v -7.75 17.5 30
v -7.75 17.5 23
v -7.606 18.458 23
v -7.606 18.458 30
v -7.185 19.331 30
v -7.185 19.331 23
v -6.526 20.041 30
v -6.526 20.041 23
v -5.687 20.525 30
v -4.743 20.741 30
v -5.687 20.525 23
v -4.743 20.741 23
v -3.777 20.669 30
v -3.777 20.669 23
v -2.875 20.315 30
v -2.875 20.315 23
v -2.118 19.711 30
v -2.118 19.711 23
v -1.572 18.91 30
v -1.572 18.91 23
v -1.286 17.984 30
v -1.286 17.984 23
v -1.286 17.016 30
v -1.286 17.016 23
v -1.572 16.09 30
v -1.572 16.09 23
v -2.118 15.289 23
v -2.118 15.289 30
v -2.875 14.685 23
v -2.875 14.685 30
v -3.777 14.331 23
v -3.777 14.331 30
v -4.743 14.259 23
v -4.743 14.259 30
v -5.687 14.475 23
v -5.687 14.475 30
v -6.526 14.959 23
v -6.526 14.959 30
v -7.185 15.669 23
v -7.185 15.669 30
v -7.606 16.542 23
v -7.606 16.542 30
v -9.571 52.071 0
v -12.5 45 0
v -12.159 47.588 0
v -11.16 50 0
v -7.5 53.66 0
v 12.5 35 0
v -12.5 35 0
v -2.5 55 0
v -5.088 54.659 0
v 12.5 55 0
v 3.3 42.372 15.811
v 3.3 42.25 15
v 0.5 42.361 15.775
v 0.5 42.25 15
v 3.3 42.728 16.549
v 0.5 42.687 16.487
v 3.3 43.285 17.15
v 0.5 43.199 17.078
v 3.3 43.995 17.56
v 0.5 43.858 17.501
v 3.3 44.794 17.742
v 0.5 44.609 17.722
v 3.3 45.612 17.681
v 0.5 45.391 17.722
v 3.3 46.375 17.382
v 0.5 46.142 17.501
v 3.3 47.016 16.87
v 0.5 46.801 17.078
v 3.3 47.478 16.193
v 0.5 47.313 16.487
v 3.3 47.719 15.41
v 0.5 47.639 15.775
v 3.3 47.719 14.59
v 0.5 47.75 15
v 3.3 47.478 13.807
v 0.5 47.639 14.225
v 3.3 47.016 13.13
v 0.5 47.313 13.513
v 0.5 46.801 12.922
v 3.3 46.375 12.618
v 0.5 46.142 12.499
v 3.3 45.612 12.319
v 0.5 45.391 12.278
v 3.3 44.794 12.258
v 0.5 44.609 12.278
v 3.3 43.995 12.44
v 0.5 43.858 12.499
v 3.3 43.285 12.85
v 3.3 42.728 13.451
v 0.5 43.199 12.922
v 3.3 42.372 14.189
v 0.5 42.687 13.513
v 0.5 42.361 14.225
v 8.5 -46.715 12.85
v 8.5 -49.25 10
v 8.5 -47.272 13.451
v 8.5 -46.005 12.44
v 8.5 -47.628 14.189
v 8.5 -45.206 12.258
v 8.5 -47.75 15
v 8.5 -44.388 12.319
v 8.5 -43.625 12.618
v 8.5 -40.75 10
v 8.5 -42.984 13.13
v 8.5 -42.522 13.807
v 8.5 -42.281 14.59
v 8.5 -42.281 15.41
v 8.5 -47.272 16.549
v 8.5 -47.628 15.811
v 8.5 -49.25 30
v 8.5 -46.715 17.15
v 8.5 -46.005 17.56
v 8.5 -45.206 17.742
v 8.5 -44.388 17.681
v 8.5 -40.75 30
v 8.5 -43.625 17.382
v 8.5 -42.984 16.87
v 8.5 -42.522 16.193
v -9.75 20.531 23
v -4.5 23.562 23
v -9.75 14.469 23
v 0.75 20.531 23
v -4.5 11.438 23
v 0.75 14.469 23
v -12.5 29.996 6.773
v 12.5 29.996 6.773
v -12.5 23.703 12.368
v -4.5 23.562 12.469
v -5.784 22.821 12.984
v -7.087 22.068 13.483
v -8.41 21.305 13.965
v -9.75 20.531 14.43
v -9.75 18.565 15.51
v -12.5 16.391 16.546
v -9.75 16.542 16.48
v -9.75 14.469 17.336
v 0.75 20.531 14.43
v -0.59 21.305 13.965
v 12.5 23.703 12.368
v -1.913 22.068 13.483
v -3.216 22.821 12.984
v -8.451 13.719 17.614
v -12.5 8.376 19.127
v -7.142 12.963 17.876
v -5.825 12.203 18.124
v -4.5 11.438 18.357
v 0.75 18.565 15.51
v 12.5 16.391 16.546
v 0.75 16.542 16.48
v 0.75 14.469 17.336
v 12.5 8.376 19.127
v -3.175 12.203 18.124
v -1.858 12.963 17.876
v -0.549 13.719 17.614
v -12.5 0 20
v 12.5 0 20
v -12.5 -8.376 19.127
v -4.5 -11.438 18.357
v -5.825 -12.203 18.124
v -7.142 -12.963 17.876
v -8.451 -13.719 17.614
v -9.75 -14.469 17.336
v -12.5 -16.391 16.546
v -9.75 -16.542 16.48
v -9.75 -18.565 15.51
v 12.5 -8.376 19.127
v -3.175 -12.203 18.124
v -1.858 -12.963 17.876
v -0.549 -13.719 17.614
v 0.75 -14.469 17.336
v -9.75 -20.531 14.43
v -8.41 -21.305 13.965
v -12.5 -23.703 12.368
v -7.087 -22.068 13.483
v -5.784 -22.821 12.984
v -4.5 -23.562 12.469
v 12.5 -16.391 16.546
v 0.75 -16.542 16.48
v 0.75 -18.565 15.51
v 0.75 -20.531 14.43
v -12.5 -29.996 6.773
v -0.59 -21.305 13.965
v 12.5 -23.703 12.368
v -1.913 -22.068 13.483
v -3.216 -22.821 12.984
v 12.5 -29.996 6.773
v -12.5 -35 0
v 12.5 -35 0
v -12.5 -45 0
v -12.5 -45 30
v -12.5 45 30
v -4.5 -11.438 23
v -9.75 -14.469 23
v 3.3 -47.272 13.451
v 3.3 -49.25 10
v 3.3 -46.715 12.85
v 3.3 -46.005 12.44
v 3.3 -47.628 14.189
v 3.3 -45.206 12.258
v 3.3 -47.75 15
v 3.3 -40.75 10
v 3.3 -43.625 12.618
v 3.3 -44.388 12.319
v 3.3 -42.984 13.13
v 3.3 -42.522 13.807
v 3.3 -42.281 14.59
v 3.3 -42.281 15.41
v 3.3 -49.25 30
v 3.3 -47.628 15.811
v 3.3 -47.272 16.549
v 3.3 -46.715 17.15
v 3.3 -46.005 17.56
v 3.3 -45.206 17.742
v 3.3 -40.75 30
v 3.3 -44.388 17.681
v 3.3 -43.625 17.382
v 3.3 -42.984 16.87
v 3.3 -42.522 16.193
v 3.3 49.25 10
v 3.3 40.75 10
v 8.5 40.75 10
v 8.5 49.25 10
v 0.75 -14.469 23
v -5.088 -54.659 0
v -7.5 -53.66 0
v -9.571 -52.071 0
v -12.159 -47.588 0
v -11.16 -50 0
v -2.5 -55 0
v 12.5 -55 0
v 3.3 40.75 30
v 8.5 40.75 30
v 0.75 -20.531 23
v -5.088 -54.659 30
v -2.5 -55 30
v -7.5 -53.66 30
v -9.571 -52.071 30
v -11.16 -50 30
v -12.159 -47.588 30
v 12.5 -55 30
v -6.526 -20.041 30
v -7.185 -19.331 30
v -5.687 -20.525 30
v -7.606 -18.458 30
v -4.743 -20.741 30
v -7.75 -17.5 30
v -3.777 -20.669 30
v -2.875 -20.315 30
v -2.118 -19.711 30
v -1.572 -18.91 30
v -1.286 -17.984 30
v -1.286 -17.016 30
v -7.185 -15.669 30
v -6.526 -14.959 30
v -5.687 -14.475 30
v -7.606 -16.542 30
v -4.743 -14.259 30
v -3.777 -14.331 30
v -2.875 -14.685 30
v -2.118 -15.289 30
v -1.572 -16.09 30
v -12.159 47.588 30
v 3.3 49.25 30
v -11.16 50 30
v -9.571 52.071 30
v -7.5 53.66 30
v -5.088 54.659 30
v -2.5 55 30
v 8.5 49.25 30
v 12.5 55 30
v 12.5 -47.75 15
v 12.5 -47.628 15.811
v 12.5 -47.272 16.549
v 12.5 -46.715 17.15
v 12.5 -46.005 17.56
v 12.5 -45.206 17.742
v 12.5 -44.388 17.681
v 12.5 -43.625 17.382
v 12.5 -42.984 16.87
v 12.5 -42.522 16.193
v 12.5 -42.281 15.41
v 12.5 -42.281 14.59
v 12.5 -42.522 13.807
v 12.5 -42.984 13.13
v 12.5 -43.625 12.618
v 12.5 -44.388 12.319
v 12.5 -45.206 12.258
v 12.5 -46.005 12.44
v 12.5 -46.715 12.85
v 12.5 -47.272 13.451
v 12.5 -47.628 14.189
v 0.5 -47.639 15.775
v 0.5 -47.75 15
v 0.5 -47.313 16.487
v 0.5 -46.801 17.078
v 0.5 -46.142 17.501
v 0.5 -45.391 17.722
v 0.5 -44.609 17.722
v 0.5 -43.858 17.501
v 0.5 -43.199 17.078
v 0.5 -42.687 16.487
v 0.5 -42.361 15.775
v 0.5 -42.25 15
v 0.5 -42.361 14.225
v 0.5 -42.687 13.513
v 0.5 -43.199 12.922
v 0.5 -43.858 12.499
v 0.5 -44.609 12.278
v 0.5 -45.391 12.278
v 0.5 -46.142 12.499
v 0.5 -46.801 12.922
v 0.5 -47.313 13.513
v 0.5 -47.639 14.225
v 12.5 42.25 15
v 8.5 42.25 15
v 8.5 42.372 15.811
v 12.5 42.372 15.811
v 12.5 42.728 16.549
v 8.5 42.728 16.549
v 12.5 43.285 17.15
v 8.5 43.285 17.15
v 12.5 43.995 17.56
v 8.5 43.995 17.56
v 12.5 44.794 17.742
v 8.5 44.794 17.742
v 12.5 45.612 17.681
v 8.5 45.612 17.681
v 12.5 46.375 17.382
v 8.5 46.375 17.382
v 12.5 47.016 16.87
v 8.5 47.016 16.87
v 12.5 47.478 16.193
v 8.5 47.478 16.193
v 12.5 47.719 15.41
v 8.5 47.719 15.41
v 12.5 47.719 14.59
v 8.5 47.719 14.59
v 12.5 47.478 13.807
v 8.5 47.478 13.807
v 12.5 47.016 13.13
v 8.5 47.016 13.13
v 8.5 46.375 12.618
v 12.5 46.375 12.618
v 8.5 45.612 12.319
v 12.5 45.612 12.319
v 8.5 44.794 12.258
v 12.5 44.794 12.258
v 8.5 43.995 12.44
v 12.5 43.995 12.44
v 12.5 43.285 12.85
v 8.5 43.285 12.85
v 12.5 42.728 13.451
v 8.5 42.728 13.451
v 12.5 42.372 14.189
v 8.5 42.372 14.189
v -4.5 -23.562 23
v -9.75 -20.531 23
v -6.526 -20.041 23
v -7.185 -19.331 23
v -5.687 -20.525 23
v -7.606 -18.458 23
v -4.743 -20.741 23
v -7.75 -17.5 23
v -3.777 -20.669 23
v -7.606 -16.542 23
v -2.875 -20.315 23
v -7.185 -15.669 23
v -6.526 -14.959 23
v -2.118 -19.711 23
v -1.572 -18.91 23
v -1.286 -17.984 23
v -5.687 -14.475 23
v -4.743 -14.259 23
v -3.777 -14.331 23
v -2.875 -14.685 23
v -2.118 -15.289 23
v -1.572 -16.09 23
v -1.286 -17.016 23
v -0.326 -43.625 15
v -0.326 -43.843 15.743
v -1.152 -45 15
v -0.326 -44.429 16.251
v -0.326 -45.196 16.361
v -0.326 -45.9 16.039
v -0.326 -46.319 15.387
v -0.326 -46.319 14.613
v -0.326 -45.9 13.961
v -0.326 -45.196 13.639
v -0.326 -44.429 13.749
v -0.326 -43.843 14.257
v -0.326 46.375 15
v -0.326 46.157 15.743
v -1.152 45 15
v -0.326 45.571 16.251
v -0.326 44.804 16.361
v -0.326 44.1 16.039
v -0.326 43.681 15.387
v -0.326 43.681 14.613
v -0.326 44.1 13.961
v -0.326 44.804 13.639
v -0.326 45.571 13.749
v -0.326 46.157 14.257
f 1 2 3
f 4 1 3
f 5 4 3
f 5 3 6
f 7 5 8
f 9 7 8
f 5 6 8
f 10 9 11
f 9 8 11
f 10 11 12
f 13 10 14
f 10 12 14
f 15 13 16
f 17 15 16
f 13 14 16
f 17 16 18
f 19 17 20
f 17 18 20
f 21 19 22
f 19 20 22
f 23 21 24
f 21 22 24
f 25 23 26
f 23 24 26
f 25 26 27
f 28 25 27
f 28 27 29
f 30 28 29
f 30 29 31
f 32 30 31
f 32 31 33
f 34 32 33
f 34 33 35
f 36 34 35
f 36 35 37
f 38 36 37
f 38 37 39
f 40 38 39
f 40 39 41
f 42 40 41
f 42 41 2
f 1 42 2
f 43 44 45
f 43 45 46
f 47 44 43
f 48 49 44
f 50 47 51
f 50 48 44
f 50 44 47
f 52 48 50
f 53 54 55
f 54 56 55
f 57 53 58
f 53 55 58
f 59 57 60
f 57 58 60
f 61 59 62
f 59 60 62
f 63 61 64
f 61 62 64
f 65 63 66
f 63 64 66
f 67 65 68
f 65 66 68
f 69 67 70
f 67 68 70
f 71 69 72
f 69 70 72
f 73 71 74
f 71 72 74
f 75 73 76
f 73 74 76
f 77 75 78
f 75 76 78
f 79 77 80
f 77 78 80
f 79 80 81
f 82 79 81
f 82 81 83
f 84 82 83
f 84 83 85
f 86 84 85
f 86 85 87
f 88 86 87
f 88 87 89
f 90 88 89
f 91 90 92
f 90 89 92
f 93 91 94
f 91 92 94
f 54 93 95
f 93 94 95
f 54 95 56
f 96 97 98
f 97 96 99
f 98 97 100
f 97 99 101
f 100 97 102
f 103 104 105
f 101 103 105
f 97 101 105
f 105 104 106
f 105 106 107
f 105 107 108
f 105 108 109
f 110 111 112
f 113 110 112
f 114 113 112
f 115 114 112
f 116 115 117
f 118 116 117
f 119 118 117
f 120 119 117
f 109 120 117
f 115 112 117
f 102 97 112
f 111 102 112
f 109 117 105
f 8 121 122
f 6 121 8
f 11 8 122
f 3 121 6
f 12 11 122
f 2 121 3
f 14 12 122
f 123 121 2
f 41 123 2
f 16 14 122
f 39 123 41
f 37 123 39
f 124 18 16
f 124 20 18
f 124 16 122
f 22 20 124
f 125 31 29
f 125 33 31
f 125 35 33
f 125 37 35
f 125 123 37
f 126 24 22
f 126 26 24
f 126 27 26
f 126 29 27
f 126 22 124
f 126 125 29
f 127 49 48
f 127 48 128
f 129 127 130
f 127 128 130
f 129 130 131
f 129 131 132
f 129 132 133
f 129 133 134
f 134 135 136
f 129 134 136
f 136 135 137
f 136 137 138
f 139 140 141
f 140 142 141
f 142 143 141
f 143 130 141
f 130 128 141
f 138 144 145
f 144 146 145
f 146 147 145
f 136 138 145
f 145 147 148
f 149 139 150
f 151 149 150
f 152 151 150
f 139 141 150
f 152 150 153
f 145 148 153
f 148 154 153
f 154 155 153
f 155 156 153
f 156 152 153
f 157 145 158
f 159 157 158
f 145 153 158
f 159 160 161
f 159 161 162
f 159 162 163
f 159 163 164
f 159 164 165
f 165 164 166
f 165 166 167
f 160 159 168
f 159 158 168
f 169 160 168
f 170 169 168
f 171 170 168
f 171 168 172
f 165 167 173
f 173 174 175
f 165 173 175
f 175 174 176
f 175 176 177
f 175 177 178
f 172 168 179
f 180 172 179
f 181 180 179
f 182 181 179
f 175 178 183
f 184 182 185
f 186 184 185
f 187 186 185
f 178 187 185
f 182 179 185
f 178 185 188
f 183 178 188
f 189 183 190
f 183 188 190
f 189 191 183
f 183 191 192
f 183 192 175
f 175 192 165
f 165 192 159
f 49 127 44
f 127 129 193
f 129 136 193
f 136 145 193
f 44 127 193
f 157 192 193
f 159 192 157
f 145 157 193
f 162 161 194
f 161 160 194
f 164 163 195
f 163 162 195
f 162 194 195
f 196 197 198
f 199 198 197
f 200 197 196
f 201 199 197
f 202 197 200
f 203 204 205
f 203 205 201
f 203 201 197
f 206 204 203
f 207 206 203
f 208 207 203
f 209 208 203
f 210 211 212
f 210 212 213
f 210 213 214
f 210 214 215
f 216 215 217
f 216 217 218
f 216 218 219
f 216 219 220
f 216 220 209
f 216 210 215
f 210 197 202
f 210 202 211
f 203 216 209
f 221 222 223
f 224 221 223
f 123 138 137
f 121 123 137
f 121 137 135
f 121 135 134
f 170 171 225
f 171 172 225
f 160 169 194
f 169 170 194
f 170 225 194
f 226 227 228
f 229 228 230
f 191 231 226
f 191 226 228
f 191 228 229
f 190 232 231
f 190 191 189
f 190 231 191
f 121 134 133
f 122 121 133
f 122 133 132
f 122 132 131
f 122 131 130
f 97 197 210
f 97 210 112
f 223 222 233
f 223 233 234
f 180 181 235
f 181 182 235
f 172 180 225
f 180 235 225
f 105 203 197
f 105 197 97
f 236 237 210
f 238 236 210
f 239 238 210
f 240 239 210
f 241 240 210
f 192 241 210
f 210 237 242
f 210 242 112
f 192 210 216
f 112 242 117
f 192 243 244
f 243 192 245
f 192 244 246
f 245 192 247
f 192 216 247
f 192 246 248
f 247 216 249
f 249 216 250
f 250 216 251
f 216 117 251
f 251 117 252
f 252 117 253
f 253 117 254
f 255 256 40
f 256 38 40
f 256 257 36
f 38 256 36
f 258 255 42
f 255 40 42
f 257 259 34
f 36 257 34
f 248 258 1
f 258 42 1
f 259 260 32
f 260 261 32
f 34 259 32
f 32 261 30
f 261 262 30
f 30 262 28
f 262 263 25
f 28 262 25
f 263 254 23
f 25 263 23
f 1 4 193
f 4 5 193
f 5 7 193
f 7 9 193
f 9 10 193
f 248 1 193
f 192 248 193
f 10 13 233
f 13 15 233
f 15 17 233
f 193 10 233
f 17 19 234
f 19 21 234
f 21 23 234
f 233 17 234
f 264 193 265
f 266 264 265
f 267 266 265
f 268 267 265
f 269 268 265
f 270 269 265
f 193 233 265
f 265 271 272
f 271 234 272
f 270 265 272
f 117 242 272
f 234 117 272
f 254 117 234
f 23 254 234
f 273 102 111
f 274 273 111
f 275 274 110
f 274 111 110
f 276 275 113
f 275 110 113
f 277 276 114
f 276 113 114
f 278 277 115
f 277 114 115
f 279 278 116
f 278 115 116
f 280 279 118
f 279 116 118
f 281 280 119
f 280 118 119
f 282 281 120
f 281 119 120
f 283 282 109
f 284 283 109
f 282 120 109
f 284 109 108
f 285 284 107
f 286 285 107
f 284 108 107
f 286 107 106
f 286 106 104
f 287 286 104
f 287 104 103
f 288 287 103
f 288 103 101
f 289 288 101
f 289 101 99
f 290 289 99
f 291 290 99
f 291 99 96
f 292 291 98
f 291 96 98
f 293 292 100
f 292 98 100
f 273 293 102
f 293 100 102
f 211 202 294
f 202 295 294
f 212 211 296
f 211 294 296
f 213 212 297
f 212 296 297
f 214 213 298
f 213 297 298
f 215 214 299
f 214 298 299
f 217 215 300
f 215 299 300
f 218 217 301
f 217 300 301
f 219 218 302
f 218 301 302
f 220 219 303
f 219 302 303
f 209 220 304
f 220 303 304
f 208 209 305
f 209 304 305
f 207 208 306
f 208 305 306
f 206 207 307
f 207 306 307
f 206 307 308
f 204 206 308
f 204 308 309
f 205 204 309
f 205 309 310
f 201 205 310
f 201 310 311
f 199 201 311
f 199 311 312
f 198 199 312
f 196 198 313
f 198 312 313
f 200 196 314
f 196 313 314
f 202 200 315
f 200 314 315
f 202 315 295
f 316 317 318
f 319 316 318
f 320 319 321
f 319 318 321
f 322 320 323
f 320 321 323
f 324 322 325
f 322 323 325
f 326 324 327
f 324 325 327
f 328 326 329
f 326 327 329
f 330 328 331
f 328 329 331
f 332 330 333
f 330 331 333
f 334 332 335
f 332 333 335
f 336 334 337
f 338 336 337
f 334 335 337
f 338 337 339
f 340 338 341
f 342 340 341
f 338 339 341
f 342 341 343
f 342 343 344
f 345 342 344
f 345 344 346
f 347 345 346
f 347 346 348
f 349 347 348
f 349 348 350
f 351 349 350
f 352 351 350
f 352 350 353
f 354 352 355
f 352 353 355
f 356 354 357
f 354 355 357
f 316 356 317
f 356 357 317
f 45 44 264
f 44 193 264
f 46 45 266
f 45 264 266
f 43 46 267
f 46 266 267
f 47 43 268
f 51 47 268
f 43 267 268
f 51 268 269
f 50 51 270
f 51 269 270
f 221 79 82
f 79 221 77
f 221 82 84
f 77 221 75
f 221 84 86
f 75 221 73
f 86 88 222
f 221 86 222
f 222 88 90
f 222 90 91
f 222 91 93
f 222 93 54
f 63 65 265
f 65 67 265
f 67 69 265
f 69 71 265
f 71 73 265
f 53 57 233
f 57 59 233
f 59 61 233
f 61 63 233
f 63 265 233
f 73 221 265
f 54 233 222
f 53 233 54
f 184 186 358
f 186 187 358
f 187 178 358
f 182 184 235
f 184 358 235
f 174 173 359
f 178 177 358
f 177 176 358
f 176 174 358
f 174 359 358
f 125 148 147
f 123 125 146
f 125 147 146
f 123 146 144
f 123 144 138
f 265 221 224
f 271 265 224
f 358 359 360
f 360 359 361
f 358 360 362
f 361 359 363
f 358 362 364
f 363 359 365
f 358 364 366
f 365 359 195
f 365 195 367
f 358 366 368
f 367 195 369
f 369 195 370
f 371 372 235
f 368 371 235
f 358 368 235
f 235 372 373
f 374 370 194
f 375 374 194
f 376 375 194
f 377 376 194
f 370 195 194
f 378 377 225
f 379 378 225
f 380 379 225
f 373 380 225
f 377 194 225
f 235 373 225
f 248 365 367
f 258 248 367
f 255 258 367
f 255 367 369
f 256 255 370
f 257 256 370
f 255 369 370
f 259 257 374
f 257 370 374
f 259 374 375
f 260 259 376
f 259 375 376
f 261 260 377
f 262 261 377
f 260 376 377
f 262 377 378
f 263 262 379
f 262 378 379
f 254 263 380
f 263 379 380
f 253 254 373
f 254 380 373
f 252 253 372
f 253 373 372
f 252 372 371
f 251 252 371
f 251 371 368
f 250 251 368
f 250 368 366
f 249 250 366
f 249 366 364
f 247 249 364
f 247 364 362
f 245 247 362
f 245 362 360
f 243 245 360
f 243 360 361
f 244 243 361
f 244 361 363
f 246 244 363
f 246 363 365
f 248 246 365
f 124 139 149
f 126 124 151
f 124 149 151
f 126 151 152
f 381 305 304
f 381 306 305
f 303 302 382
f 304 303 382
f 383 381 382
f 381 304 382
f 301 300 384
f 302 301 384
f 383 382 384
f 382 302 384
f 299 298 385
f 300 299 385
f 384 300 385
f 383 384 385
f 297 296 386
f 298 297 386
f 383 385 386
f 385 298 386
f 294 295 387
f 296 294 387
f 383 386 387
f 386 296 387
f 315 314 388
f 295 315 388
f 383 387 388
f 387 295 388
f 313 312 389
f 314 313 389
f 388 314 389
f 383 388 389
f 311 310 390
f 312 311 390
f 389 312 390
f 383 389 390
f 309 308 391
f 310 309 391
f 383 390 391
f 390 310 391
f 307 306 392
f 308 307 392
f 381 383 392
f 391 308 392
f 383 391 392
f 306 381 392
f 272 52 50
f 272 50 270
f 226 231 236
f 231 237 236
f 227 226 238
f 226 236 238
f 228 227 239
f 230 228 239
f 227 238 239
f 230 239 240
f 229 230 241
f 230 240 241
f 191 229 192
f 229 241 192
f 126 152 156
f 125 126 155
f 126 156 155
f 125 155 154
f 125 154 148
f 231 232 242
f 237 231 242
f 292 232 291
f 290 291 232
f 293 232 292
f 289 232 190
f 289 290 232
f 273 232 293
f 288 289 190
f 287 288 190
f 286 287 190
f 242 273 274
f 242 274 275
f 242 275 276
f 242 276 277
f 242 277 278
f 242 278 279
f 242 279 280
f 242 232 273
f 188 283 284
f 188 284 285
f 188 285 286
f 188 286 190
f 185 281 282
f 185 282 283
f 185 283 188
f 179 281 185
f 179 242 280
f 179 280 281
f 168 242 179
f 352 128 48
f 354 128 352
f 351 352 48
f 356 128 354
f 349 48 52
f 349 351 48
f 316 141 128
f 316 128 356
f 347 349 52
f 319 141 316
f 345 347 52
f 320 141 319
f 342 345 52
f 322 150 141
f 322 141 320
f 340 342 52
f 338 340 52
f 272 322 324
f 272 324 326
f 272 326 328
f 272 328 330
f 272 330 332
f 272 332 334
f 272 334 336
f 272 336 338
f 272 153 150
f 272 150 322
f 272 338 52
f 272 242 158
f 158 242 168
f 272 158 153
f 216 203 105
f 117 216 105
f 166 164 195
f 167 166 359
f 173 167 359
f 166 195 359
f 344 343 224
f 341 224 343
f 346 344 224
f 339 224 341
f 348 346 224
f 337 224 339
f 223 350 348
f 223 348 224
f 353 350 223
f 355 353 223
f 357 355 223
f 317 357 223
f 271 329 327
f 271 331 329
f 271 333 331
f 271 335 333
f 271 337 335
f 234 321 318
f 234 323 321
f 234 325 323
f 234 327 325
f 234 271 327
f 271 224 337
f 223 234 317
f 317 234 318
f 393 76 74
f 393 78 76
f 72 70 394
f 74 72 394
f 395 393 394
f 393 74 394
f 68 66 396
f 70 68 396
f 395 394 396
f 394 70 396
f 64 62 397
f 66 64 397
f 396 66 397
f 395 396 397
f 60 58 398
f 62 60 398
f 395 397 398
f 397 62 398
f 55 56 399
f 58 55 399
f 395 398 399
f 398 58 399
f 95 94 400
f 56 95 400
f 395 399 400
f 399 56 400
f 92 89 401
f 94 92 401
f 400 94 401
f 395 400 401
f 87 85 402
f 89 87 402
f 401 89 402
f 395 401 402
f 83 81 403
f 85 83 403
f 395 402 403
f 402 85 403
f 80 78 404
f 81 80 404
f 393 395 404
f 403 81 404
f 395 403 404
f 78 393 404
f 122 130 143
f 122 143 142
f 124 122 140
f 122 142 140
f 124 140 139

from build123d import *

# Parameters (mm, degrees)
F0_W           = 110
F0_H           = 30
F1_DEPTH       = 12.5
F3_D           = 5.5
F3_DEPTH       = 12
F3_TIP         = 1.6523667023
F5_DEPTH       = 25
F7_D           = 6.5
F10_DEPTH      = 3
F10_DEPTH_BACK = 20.0010001
F11_W          = 5.2
F11_H          = 8.5
F12_DEPTH      = 20
F13_R          = 10


# Not quite as in the source:
# - a pattern or mirror of a feature is missing from the dataset's text; its kind, count and spacing are read off the source's solid


with BuildPart() as f1:
    # F0 (on Right) → F1 (new body, symmetric)
    with BuildSketch(Plane.YZ):
        with Locations((0, 15)):
            Rectangle(F0_W, F0_H)
    extrude(amount=F1_DEPTH, both=True)

    # F3
    with Locations(Plane.YZ.offset(12.5)):
        with Locations((-45, 15), (45, 15)):
            Hole(F3_D / 2, depth=F3_DEPTH)
            with Locations((0, 0, -(F3_DEPTH + F3_TIP / 2))):  # 118° drill point
                Cone(0, F3_D / 2, F3_TIP, mode=Mode.SUBTRACT)

    # F4 (on face) → F5 (cut, through all)
    with BuildSketch(Plane.YZ.offset(12.5)):
        with BuildLine():
            Line((-35, 0), (35, 0))
            ThreePointArc((35, 0), (0, 20), (-35, 0))
        make_face()
    extrude(amount=-F5_DEPTH, mode=Mode.SUBTRACT)

    # F7 (through all)
    with Locations(Plane.XY.offset(30)):
        with Locations((-4.5, 17.5), (-4.5, -17.5)):
            Hole(F7_D / 2)

    # F9 (on offset) → F10 (cut, two sides)
    with BuildSketch(Plane.XY.offset(20)) as f10_sk:
        Polygon((-9.75, -20.5310889132), (-4.5, -23.5621778265), (0.75, -20.5310889132), (0.75, -14.4689110868), (-4.5, -11.4378221735), (-9.75, -14.4689110868), align=None)
    f10 = extrude(amount=F10_DEPTH, mode=Mode.SUBTRACT) + extrude(f10_sk.sketch, amount=-F10_DEPTH_BACK, mode=Mode.SUBTRACT)

    # F10_copies: F10 across plane
    add(f10.mirror(Plane.ZX), mode=Mode.SUBTRACT)

    # F11 (on face) → F12 (cut)
    with BuildSketch(Plane.XY.offset(30)):
        with Locations((5.9, -45)):
            Rectangle(F11_W, F11_H)
    f12 = extrude(amount=-F12_DEPTH, mode=Mode.SUBTRACT)

    # F12_copies: F12 across plane
    add(f12.mirror(Plane.ZX), mode=Mode.SUBTRACT)

    # F13
    f13_edges = [f1.edges().sort_by_distance(p)[0] for p in [
        (-12.5, -55, 15),
        (-12.5, 55, 15),
    ]]
    fillet(f13_edges, radius=F13_R)


solid = f1.part
